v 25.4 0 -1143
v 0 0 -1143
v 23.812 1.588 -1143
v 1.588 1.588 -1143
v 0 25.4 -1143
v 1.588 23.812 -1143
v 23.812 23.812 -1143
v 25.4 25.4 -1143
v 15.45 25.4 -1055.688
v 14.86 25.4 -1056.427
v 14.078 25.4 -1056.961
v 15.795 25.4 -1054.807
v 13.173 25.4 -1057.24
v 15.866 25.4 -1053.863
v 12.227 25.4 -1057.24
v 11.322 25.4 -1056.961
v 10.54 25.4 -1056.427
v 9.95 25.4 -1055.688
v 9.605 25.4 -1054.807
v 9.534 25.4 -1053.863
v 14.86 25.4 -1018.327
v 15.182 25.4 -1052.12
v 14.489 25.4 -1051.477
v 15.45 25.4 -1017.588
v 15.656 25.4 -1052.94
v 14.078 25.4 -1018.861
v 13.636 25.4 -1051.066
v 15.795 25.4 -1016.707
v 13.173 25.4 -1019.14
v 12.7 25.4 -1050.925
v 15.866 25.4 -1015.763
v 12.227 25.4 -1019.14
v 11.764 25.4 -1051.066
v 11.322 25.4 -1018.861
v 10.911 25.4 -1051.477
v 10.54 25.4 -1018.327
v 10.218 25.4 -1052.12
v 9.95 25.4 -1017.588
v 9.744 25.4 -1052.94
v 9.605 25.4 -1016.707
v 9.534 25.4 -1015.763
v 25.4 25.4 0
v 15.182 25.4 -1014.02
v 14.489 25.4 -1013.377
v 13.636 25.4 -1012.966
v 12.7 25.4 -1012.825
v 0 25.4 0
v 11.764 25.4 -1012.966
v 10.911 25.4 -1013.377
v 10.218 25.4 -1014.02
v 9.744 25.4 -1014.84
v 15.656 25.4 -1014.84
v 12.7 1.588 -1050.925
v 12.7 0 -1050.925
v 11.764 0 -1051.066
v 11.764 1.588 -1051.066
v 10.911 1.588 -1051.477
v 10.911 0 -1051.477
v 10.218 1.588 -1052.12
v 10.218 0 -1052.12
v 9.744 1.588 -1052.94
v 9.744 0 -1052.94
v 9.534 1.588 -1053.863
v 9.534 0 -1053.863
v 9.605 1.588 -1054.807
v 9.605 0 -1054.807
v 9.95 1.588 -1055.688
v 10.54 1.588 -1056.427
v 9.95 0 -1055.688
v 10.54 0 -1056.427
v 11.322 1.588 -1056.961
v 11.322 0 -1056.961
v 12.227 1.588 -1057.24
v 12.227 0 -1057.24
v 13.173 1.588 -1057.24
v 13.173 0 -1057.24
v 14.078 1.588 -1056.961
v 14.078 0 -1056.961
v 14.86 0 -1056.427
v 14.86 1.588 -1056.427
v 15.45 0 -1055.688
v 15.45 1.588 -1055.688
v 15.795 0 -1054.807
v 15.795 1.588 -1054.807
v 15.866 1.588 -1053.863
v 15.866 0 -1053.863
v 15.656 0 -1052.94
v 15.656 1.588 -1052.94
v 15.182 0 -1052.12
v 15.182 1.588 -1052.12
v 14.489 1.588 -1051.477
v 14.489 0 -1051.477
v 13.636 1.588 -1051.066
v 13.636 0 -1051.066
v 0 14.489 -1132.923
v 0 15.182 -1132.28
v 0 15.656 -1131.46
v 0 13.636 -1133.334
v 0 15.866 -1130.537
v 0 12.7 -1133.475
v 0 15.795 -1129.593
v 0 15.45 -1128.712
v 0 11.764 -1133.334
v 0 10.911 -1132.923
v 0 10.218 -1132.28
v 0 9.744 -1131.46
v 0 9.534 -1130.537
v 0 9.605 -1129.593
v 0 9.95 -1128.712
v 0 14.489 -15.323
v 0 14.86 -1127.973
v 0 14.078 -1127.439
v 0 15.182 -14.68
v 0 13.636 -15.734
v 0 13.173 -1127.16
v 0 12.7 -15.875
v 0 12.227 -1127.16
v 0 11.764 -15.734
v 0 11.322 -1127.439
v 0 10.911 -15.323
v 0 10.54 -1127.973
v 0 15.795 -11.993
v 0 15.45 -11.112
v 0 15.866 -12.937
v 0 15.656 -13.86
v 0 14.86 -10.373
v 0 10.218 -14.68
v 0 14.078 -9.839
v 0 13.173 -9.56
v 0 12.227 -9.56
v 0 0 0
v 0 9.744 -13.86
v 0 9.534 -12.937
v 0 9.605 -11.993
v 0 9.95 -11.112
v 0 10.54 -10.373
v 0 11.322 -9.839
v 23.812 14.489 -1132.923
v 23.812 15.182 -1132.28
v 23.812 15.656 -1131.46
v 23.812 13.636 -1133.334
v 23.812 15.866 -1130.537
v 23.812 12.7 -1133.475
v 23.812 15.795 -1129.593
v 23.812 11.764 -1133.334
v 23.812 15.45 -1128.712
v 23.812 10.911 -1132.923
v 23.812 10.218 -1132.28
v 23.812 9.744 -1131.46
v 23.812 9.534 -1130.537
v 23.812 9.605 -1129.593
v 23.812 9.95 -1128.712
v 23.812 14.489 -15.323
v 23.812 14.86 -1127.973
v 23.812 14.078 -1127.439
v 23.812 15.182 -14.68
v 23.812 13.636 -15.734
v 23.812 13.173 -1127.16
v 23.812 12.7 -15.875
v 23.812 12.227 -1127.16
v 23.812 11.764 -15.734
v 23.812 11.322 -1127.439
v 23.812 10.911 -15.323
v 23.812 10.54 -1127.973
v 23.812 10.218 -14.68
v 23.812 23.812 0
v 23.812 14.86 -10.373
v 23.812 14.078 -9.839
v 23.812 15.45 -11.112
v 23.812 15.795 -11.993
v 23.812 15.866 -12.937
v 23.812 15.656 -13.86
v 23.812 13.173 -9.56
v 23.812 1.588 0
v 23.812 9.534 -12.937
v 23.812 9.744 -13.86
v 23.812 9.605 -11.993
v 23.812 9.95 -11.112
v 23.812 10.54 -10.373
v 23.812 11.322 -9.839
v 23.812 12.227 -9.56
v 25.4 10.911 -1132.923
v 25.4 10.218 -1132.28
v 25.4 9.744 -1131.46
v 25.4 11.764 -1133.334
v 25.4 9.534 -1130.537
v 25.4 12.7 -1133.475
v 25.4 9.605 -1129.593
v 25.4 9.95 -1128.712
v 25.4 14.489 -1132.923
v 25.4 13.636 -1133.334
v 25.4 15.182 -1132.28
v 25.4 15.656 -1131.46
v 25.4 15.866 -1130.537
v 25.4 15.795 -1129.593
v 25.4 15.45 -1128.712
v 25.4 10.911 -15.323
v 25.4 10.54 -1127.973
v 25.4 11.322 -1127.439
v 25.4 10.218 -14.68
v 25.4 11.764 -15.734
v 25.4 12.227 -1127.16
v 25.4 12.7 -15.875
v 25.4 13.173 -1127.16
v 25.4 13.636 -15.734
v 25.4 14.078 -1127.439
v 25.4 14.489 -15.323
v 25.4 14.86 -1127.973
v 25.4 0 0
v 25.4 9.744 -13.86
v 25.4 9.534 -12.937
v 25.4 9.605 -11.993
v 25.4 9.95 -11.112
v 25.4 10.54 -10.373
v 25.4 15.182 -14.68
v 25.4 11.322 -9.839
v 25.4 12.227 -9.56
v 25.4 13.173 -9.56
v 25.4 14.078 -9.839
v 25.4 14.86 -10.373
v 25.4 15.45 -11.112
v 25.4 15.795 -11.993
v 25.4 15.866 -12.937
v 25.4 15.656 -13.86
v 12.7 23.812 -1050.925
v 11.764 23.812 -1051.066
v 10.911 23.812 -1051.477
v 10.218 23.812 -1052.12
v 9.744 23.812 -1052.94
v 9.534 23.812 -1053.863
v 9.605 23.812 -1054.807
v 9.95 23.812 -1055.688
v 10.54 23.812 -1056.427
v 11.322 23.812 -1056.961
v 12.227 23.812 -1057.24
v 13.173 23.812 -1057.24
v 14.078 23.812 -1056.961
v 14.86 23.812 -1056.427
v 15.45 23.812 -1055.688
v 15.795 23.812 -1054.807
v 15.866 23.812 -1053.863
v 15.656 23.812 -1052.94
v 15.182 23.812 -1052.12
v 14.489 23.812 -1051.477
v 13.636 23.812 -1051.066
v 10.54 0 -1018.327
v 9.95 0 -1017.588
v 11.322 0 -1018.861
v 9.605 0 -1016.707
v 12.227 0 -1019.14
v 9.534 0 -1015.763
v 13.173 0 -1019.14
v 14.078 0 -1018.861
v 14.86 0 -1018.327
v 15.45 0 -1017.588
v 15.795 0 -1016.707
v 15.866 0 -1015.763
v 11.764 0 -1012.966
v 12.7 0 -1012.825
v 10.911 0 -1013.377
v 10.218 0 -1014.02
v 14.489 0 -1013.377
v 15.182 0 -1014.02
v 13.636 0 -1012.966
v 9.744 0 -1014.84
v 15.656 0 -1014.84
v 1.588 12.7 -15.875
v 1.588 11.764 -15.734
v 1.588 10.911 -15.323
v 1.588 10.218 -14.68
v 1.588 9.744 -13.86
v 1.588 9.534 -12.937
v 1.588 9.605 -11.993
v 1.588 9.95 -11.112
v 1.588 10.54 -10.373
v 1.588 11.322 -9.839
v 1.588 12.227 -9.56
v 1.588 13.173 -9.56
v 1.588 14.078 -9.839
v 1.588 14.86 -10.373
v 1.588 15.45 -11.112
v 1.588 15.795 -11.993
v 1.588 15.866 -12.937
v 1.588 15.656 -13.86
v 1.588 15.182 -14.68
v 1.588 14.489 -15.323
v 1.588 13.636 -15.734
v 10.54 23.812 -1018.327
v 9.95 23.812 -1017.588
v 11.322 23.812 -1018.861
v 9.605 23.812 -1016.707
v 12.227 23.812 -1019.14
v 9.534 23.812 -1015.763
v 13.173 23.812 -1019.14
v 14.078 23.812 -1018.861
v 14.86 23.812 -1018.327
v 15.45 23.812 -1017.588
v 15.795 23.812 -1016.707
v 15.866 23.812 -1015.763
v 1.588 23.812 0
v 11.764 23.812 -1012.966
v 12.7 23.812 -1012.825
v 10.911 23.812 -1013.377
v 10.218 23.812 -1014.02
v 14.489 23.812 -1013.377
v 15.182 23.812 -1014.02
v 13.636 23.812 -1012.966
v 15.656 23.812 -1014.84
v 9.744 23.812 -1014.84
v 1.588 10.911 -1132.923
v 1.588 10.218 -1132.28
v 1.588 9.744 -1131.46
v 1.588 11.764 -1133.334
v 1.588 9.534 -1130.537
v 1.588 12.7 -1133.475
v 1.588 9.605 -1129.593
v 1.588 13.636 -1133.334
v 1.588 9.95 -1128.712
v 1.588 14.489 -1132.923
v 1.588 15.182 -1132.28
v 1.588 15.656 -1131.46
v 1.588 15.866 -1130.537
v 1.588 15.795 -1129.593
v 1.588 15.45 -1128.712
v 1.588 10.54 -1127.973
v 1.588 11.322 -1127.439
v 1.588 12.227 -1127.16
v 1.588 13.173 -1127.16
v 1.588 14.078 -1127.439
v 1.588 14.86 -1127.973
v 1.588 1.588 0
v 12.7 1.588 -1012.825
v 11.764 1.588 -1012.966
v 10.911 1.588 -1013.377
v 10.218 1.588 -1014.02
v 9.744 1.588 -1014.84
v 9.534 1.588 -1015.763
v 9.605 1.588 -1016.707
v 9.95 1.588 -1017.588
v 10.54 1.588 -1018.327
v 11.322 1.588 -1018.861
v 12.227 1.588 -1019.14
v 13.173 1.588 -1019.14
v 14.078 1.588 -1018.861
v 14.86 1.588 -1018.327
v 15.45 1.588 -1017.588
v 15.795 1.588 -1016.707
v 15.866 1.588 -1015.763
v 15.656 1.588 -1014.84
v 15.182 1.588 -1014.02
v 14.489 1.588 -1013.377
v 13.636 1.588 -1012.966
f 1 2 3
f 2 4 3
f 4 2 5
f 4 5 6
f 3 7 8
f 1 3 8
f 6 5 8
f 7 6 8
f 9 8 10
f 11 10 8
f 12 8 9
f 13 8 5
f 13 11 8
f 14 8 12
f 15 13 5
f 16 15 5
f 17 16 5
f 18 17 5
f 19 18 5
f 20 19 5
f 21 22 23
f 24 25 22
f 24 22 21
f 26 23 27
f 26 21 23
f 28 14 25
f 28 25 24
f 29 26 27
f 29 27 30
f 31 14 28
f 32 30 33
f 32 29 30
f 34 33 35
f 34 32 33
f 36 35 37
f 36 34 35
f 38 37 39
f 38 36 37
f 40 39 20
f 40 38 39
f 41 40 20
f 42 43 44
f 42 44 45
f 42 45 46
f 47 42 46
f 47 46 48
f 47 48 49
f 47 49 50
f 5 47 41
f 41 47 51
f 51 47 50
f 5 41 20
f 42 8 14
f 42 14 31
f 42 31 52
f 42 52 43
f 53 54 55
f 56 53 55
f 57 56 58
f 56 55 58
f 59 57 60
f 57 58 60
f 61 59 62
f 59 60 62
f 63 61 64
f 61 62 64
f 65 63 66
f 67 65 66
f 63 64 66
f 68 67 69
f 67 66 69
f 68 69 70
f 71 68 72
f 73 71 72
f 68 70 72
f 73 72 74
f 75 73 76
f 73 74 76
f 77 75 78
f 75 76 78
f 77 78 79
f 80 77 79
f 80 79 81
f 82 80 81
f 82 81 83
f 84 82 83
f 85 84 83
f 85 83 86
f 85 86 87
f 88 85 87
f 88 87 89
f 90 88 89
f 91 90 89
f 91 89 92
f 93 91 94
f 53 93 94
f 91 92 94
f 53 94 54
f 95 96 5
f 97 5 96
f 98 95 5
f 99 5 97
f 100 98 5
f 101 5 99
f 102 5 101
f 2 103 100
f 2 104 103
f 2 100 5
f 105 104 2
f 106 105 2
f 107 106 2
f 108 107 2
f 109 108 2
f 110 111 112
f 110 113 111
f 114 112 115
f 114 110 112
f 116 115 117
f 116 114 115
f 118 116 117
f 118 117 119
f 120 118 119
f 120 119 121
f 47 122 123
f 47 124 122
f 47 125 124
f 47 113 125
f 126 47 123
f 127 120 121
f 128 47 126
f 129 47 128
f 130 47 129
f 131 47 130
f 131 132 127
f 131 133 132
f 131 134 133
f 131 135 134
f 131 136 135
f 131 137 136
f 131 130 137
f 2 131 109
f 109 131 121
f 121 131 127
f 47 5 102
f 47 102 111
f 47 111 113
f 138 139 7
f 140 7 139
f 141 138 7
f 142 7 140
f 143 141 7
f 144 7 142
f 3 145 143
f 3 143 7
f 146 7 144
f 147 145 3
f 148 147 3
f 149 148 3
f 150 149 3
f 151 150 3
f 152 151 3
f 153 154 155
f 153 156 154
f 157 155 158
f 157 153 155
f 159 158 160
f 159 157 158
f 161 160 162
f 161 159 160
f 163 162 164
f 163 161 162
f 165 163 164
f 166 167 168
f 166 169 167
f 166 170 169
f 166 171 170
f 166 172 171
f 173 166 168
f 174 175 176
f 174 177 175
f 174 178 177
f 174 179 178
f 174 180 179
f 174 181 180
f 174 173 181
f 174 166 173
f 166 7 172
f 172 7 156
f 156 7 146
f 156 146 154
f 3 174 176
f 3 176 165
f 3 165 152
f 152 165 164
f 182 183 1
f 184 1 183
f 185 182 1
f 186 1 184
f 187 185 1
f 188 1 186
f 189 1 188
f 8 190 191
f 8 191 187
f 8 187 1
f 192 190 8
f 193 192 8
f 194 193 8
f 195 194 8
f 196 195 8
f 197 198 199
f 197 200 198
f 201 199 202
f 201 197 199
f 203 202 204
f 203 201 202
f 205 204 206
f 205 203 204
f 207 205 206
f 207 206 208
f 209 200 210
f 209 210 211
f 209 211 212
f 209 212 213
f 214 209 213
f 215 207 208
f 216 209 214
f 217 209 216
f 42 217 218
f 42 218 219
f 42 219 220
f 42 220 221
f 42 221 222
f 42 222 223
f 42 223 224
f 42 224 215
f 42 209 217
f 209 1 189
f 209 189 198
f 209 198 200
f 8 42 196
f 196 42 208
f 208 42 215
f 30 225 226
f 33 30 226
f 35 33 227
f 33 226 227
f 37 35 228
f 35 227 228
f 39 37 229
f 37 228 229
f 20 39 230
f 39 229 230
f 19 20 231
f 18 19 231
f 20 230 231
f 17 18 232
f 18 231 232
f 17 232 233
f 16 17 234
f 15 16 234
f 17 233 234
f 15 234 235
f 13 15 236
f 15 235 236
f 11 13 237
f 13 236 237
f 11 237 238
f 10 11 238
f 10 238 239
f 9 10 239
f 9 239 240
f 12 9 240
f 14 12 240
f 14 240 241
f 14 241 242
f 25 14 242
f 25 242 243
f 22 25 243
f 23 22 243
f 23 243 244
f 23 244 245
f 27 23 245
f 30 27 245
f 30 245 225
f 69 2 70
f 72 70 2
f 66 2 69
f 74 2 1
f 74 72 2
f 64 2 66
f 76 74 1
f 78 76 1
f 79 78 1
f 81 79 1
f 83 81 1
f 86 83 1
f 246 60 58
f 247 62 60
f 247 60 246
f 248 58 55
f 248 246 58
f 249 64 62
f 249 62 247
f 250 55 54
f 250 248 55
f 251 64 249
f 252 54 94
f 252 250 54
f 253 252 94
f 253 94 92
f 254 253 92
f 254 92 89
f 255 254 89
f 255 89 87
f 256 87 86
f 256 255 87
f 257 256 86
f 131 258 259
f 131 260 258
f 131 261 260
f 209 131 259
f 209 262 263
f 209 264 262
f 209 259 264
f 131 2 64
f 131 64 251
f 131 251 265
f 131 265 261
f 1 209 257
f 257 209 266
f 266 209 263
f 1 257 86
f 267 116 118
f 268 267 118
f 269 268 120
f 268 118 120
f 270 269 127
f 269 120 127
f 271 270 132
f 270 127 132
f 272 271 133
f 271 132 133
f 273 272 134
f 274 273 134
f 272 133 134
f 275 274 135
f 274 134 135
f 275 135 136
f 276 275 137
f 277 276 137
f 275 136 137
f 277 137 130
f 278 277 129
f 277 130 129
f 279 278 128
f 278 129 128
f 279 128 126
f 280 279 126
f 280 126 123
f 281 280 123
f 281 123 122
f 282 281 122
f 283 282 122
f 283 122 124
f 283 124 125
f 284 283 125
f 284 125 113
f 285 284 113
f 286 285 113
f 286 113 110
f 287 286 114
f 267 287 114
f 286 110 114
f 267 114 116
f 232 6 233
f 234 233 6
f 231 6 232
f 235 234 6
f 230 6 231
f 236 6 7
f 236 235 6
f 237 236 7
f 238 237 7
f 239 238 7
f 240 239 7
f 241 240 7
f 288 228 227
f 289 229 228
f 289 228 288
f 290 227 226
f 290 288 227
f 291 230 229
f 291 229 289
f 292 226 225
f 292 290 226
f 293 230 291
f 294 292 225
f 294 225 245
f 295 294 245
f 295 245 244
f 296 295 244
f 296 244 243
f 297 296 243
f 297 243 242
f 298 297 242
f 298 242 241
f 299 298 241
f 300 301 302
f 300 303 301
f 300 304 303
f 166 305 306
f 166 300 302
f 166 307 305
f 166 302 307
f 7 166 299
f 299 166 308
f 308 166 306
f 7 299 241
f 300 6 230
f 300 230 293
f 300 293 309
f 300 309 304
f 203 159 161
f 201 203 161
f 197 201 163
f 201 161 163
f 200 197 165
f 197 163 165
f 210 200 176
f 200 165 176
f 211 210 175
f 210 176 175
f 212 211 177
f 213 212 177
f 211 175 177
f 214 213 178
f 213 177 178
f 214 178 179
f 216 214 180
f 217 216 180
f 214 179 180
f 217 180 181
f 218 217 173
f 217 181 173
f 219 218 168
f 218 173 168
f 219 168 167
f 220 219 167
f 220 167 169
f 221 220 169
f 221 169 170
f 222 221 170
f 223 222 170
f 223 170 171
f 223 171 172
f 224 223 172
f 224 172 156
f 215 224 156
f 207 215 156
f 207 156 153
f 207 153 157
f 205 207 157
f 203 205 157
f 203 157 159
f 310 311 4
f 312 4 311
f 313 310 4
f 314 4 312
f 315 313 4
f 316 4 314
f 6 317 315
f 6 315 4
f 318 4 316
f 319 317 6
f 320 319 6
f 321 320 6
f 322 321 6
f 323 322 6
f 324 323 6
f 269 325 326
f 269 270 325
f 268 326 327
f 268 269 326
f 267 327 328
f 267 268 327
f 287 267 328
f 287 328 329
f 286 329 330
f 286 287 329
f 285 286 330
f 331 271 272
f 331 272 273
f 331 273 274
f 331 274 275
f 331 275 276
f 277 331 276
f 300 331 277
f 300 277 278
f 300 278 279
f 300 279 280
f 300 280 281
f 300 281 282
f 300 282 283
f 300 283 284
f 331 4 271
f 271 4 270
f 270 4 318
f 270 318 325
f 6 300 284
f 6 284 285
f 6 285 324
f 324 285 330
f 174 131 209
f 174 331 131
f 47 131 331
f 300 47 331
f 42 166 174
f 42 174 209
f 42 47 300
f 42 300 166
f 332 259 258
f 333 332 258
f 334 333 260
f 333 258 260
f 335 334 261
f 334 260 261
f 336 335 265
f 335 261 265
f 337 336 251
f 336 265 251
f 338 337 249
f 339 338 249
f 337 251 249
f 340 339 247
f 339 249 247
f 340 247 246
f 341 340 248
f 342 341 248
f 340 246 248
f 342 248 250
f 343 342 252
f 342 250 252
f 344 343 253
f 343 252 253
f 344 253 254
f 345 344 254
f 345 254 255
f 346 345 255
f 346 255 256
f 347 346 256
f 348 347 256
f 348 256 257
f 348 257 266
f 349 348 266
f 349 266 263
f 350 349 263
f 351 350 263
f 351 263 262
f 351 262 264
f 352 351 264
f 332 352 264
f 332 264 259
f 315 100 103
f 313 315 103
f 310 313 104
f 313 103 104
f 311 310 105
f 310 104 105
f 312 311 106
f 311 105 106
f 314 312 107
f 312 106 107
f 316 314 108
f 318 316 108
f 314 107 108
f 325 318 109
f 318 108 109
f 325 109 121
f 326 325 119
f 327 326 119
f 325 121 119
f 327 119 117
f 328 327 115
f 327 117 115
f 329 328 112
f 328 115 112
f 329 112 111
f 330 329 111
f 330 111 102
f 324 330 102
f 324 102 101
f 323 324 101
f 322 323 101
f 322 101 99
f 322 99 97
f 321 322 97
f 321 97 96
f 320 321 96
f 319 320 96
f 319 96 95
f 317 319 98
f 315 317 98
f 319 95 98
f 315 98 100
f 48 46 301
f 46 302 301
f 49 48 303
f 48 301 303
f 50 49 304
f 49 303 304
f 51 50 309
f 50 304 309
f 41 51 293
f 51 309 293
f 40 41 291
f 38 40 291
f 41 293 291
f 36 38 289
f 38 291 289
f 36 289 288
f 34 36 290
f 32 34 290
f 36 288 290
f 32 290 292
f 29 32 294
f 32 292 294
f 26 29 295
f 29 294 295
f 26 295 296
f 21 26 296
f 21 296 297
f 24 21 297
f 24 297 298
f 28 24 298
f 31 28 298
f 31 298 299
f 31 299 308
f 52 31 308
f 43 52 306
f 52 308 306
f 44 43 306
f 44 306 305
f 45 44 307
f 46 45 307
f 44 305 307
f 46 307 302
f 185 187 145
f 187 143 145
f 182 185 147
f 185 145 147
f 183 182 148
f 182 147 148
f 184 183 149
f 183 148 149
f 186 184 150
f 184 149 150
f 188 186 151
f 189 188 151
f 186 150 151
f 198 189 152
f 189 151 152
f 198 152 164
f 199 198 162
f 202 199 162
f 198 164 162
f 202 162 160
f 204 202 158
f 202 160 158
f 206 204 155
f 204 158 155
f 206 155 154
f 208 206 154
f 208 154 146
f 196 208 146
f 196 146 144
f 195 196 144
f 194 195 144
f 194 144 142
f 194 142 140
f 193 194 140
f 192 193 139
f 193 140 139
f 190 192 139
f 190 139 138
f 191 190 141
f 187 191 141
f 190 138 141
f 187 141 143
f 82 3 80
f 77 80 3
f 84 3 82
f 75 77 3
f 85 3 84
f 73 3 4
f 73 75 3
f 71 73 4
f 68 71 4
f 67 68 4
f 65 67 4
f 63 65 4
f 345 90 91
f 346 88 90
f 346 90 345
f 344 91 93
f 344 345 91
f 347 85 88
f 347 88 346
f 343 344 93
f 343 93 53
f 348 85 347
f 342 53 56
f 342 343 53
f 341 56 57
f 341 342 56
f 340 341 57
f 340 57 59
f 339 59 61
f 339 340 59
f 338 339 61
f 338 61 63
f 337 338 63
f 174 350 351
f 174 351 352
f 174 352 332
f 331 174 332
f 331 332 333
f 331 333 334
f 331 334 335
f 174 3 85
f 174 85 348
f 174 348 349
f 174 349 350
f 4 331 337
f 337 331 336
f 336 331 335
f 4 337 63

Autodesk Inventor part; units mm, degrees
ref_plane "YZ Plane" through (0, 0, 0) normal (1, 0, 0) x (0, 1, 0)
ref_plane "XZ Plane" through (0, 0, 0) normal (0, 1, 0) x (-1, 0, 0)
ref_plane "XY Plane" through (0, 0, 0) normal (0, 0, 1) x (1, 0, 0)
sketch "Sketch1" plane through (0, 0, 0) normal (0, 0, 1) x (1, 0, 0)
  line L0 (0, 0) -> (25.4, 0)
  line L1 (25.4, 0) -> (25.4, 25.4)
  line L2 (25.4, 25.4) -> (0, 25.4)
  line L3 (0, 25.4) -> (0, 0)
  line L4 (1.5875, 23.8125) -> (23.8125, 23.8125)
  line L5 (23.8125, 23.8125) -> (23.8125, 1.5875)
  line L6 (23.8125, 1.5875) -> (1.5875, 1.5875)
  line L7 (1.5875, 1.5875) -> (1.5875, 23.8125)
  dimension "d0" = 25.4
  dimension "d1" = 25.4
  dimension "d2" = 1.5875
extrude "Extrusion1" add sketch "Sketch1" against normal blind 1143
sketch "Sketch2" plane through (25.4, 0, 0) normal (1, 0, 0) x (0, 0, -1)
  line L0 (1143, 0) -> (1143, 25.4) projected
  line L1 (0, 0) -> (0, 25.4) projected
  point P0 (12.7, 12.7)
  point P1 (1130.3, 12.7)
  dimension "d5" = 12.7
  dimension "d6" = 12.7
hole "Hole1" at (25.4, 12.7, -12.7) at (25.4, 12.7, -1130.3) direction (-1, 0, 0) diameter 6.35 depth 25.4 tip angle 118
sketch "Sketch3" plane through (0, 25.4, 0) normal (0, 1, 0) x (1, 0, 0)
  line L0 (25.4, 1143) -> (0, 1143) projected
  point P0 (12.7, 1016)
  point P1 (12.7, 1054.1)
  dimension "d14" = 38.1
  dimension "d23" = 88.9
hole "Hole2" at (12.7, 25.4, -1016) at (12.7, 25.4, -1054.1) direction (0, -1, 0) diameter 6.35 depth 25.4 tip angle 118
properties part number "1tube_40"
